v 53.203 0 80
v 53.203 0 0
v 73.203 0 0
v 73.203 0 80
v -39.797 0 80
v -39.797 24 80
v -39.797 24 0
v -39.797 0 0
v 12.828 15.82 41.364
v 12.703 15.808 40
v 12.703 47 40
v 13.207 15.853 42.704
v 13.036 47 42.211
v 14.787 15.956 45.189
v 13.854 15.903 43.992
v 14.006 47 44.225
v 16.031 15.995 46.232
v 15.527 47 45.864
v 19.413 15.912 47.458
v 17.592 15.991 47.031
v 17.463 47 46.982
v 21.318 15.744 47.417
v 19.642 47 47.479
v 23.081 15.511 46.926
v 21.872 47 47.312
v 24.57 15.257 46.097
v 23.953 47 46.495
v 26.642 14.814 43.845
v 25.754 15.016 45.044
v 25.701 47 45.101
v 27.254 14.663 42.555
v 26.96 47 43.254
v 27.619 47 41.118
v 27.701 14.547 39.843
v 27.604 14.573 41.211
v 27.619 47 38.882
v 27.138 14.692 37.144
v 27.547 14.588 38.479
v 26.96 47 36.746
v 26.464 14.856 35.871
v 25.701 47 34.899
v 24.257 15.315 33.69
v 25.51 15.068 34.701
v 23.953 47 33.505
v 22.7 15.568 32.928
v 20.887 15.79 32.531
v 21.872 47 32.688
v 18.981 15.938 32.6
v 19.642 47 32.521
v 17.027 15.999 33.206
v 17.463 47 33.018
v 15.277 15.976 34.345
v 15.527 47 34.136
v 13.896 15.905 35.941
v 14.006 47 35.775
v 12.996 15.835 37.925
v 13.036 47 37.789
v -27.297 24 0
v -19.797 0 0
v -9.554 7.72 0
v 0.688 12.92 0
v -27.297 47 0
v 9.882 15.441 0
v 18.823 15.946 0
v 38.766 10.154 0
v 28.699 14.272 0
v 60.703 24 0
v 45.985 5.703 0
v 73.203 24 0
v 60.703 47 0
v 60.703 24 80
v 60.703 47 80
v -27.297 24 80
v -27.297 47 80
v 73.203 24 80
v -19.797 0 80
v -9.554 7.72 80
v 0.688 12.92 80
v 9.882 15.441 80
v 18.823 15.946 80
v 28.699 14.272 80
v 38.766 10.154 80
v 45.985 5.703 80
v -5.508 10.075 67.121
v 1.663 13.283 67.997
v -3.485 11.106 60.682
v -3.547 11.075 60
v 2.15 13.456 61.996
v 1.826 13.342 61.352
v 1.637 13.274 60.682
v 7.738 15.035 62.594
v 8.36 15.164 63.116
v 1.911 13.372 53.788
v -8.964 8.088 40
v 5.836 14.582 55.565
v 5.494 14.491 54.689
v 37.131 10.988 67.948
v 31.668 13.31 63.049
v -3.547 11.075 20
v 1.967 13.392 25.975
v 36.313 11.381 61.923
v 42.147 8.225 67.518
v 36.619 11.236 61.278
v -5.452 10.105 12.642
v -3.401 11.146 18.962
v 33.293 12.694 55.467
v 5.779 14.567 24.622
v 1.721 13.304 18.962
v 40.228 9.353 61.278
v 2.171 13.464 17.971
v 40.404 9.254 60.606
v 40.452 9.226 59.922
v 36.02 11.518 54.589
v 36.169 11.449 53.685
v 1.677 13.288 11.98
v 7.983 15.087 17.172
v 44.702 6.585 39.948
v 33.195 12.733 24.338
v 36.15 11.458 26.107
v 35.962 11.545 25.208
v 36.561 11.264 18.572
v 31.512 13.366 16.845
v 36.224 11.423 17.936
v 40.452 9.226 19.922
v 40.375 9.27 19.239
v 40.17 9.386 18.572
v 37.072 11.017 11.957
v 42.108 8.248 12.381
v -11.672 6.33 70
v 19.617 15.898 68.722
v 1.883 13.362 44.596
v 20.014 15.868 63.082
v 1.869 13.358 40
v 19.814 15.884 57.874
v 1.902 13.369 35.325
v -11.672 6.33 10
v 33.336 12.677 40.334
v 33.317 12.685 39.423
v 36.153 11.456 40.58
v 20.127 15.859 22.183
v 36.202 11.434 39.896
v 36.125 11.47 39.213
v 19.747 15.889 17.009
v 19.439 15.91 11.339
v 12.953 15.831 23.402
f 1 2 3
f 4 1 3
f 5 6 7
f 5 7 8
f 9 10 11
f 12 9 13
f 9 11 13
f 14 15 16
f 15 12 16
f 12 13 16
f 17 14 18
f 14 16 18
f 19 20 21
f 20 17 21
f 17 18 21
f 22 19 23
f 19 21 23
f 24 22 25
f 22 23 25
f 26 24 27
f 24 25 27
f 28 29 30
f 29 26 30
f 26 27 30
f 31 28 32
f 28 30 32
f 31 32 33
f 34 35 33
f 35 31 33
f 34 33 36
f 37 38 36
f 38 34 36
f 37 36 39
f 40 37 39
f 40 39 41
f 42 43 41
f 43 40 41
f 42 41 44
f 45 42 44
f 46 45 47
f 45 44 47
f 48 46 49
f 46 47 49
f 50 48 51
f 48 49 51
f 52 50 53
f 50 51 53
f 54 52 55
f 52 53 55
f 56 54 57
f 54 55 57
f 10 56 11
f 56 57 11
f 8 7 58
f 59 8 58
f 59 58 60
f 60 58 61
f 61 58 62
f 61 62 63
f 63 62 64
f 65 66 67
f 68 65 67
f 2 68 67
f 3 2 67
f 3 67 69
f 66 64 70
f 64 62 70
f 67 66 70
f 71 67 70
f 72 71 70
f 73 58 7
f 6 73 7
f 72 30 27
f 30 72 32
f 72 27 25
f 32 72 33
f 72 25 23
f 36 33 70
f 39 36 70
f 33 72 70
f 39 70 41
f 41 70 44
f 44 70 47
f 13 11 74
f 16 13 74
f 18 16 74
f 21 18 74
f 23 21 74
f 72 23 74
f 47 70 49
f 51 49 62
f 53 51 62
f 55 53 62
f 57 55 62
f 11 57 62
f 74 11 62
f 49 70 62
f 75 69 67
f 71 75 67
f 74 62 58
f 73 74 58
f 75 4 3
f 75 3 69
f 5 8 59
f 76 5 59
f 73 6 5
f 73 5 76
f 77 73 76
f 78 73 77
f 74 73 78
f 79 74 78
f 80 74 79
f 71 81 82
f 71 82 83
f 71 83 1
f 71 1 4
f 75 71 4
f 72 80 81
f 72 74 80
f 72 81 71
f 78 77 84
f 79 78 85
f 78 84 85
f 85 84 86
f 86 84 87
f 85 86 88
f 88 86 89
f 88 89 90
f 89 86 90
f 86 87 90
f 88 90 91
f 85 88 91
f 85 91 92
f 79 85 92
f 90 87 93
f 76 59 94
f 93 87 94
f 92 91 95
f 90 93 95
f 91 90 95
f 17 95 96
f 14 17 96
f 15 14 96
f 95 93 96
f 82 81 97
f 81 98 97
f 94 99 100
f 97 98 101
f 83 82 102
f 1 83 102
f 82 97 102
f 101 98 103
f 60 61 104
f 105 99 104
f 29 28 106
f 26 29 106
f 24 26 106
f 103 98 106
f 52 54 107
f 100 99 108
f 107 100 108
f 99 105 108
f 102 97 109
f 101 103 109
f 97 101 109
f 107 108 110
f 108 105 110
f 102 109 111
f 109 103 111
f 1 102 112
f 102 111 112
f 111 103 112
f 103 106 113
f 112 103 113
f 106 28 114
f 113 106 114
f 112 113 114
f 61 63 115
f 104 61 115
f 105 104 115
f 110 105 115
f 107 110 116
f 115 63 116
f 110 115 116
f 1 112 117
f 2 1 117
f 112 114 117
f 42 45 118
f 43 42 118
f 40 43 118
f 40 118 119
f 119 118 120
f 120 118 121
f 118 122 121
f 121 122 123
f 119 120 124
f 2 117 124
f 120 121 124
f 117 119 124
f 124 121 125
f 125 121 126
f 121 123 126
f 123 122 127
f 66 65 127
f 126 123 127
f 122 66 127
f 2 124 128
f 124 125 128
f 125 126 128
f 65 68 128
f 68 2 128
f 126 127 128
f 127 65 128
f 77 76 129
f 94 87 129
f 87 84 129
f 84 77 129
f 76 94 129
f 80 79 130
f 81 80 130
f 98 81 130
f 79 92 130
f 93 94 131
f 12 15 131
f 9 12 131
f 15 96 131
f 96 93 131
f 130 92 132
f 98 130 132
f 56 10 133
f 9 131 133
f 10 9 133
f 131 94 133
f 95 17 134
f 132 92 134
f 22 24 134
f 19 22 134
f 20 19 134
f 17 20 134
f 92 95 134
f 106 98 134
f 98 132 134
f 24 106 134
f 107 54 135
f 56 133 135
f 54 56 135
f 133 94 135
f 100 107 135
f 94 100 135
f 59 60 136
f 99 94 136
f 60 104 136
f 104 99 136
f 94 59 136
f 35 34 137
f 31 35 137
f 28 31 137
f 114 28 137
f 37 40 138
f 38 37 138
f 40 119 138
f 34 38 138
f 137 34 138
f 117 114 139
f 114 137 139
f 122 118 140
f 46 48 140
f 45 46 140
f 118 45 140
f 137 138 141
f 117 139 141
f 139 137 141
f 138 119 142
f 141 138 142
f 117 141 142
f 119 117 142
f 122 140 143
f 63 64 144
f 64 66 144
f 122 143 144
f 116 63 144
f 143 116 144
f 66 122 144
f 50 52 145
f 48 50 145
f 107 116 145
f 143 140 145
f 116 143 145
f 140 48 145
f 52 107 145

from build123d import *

# Parameters (mm, degrees)
EXTRUDE_1_DEPTH     = 80
SKETCH_4_R          = 7.5
CUT_EXTRUDE_1_DEPTH = 119.184803146


with BuildPart() as part:
    # 草图3 → 凸台-拉伸1 (new body)
    with BuildSketch(Plane.XY):
        with BuildLine():
            Line((60.702784473, 47), (-27.297215527, 47))
            Line((-27.297215527, 47), (-27.297215527, 24))
            Line((-27.297215527, 24), (-39.797215527, 24))
            Line((-39.797215527, 24), (-39.797215527, 0))
            Line((-39.797215527, 0), (-19.797215527, 0))
            add(Edge.make_bspline(
                [(-19.797215527, 0), (16.702784473, 32), (53.202784473, 0)],
                knots=[0, 0, 0, 1, 1, 1], degree=2))
            Line((53.202784473, 0), (73.202784473, 0))
            Line((73.202784473, 0), (73.202784473, 24))
            Line((73.202784473, 24), (60.702784473, 24))
            Line((60.702784473, 24), (60.702784473, 47))
        make_face()
    extrude(amount=EXTRUDE_1_DEPTH)

    # 草图4 → 切除-拉伸1 (cut, through all)
    with BuildSketch(Plane(origin=(0, 47, 0), x_dir=(1, 0, 0), z_dir=(0, 1, 0))):
        with Locations(Location((20.202784473, -40, 0), (0, 0, 180))):
            Circle(SKETCH_4_R)
    extrude(amount=-CUT_EXTRUDE_1_DEPTH, mode=Mode.SUBTRACT)


solid = part.part
